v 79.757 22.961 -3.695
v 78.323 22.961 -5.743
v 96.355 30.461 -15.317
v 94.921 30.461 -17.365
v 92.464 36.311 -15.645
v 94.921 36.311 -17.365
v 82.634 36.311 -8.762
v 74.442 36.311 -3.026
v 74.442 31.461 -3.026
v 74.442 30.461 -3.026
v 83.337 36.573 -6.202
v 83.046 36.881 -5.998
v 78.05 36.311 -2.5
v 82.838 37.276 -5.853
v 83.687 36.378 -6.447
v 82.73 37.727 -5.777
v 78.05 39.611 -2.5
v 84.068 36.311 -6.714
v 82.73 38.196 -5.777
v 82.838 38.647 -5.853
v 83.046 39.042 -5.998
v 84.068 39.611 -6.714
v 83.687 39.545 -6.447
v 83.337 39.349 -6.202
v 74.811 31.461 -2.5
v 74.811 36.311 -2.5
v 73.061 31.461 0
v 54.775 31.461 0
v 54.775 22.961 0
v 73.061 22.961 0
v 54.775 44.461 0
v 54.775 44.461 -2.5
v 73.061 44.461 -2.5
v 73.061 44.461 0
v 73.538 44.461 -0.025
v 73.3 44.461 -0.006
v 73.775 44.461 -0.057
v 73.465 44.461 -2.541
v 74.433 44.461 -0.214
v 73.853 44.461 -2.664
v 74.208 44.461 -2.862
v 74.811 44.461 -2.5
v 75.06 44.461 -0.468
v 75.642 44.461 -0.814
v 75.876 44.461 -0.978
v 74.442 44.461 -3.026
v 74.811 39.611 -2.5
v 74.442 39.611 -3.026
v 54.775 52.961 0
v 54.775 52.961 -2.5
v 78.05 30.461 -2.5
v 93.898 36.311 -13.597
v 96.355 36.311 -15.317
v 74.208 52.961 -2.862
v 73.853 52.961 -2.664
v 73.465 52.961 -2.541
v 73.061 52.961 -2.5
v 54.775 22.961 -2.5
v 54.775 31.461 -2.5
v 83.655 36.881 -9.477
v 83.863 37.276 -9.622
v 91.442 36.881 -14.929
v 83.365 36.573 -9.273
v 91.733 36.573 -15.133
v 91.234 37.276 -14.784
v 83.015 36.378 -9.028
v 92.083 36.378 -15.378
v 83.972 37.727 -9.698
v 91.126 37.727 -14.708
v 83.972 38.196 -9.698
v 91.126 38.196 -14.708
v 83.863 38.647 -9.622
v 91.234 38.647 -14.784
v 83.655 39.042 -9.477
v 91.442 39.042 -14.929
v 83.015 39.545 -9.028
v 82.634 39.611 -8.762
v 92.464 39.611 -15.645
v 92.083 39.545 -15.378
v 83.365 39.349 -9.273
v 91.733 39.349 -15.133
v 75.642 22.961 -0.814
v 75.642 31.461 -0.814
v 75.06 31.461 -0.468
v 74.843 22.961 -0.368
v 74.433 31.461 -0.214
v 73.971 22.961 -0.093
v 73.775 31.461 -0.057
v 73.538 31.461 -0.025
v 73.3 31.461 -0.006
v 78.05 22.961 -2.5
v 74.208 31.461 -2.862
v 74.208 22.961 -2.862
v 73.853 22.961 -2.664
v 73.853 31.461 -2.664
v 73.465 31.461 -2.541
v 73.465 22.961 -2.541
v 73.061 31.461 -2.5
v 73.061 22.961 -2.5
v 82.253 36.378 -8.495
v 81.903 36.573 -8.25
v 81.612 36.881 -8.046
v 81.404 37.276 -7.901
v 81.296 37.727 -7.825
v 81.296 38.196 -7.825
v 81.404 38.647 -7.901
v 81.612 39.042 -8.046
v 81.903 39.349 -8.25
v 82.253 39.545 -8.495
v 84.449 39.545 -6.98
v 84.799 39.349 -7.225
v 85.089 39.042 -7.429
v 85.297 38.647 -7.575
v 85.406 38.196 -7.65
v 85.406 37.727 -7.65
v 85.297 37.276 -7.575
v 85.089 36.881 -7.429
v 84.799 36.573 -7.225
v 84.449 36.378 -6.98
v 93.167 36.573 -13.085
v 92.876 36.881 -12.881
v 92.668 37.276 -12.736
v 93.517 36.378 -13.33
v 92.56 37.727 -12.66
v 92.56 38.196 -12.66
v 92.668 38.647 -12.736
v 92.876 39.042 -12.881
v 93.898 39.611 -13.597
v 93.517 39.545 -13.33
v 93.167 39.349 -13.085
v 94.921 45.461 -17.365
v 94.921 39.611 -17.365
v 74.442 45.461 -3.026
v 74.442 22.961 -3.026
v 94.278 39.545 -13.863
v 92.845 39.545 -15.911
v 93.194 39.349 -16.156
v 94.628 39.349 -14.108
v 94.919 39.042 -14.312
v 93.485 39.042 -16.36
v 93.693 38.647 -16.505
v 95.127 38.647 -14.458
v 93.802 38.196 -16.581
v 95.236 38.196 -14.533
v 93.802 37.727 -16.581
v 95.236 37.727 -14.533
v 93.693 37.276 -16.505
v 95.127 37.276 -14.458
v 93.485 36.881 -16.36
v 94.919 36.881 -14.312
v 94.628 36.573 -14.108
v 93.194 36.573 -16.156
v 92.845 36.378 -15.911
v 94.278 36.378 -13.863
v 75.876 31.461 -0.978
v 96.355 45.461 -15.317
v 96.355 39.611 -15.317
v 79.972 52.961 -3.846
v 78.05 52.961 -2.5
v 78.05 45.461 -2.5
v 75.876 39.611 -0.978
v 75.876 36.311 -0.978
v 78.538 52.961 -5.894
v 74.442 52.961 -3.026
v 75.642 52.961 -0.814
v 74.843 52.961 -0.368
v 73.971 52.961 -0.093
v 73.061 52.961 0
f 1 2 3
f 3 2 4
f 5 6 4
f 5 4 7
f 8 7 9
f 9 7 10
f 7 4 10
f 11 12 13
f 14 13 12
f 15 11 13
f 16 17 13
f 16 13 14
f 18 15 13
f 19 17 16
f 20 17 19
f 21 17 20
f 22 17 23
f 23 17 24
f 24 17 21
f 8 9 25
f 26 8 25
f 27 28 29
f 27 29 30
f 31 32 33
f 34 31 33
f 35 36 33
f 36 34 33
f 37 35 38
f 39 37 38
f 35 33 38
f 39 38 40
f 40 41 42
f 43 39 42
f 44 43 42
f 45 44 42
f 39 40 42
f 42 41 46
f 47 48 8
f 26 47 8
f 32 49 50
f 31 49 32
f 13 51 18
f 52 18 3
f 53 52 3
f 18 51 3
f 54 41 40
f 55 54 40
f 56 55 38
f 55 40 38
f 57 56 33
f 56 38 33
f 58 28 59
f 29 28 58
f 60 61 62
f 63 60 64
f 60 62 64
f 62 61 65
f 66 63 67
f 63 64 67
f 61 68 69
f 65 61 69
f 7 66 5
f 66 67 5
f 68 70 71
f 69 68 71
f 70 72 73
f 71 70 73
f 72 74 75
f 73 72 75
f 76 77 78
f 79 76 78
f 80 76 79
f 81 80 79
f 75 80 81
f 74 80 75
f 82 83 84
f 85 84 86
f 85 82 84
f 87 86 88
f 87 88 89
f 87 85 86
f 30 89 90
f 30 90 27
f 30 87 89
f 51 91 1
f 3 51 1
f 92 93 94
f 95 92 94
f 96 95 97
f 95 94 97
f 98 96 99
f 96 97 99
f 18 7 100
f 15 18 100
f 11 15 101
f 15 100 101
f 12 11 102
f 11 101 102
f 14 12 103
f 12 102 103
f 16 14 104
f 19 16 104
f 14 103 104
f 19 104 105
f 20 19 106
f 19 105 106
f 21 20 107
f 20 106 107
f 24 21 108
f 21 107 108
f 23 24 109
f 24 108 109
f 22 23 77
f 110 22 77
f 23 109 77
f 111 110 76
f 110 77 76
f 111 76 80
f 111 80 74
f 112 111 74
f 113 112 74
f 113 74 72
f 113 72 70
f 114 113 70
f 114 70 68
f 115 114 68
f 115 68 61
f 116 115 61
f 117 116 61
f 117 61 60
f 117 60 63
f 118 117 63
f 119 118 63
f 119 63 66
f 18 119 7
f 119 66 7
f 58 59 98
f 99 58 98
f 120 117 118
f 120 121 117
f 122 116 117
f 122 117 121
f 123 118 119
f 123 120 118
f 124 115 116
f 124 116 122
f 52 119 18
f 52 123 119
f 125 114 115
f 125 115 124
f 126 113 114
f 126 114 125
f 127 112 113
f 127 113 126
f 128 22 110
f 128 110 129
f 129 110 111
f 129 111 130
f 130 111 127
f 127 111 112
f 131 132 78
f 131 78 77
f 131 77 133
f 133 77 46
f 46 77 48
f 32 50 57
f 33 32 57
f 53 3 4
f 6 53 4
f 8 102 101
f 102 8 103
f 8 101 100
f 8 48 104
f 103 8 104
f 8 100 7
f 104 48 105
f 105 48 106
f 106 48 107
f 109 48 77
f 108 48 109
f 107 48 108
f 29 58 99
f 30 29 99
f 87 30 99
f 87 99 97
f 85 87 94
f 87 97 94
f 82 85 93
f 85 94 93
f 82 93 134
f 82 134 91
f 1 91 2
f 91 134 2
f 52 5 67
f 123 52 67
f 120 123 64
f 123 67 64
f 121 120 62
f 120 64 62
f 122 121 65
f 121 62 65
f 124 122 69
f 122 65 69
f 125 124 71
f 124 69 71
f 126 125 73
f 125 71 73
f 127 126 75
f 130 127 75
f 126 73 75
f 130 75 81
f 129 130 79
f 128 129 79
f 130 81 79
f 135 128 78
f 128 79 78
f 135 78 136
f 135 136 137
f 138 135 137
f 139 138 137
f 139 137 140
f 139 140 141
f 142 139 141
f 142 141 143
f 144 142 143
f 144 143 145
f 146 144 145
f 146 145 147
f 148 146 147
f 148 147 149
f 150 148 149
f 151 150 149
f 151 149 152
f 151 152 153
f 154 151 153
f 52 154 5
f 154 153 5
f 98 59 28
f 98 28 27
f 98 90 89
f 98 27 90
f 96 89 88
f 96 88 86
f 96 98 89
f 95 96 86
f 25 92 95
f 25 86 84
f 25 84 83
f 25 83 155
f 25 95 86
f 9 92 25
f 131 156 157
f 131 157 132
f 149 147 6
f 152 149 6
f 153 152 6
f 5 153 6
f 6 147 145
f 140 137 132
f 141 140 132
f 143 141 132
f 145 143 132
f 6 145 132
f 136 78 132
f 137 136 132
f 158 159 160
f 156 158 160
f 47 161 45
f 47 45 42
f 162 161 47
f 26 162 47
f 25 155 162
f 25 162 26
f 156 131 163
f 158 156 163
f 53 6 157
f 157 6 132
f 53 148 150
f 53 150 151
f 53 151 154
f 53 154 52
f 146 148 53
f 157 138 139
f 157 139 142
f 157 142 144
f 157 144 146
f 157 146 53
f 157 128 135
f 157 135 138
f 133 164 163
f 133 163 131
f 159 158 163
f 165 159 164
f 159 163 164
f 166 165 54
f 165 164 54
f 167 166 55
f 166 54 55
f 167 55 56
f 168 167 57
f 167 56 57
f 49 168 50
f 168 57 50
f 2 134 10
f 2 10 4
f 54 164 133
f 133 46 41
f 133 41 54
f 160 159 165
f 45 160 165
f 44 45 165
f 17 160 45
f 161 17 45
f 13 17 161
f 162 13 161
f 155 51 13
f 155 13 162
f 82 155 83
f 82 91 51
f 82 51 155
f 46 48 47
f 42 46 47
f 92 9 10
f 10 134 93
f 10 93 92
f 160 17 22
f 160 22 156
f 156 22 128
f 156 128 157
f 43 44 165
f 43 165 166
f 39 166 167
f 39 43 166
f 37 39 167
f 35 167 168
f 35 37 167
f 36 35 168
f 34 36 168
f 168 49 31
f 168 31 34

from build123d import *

# Parameters (mm, degrees)
SM_BASE_FLANGE_1_DEPTH = 2.5
HOLE_WIZARD_M41_D      = 3.3
OTHER_START            = 45.056896686
OTHER_7_OUTLINE_R      = 1.65
OTHER_7_DEPTH          = 7.095461821
OTHER_START_2          = 22.961384977
OTHER_7_2_DEPTH        = 30
OTHER_START_3          = 31.461384977
OTHER_7_3_DEPTH        = 13
OTHER_START_4          = 39.611384977
OTHER_7_4_DEPTH        = 5.85
OTHER_START_5          = 30.461384977
OTHER_7_5_DEPTH        = 5.8499999
OTHER_7_6_DEPTH        = 8.5
OTHER_START_6          = 44.461384977
OTHER_7_7_DEPTH        = 8.5
OTHER_START_7          = 40.219785041
OTHER_7_8_DEPTH        = 2.5


with BuildPart() as part:
    # Базовая кромка1: sheet metal written as solids
    # Sketch 1 → Базовая кромка1 (new body)
    with BuildSketch(Plane.XY):
        Polygon((54.77467234, 44.461384977), (73.77467234, 44.461384977), (73.77467234, 31.461384977), (54.77467234, 31.461384977), (54.77467234, 22.961384977), (78.511603406, 22.961384977), (98.77467234, 30.461384977), (98.77467234, 45.461384977), (78.77467234, 52.961384977), (54.77467234, 52.961384977), align=None)
    extrude(amount=-SM_BASE_FLANGE_1_DEPTH)

    # Отверстие обработанное метчиком M41 (through all)
    with Locations(Plane.XY):
        with Locations((83.77467234, 37.961384977), (95.77467234, 37.961384977)):
            Hole(HOLE_WIZARD_M41_D / 2)

    # Other 7: read off the stored shape, not the designer's step
    # Other 7 outline → Other 7 (cut)
    with BuildSketch(Plane(origin=(0, 0, 0), x_dir=(0.819152044288991, 0, -0.5735764363510472), z_dir=(0.5735764363510472, 0, 0.8191520442889911)).offset(OTHER_START)):
        with Locations((72.715175855, 37.961384977)):
            Circle(OTHER_7_OUTLINE_R)
    extrude(amount=OTHER_7_DEPTH, mode=Mode.SUBTRACT)

    # Other 7 2 outline → Other 7 2 (cut)
    with BuildSketch(Plane(origin=(0, 0, 0), x_dir=(1, 0, 0), z_dir=(0, 1, 0)).offset(OTHER_START_2)):
        with BuildLine():
            Line((98.77467234, 2.5), (78.050042356, 2.5))
            Line((78.050042356, 2.5), (75.641921753, 0.813815801))
            ThreePointArc((75.641921753, 0.813815801), (74.414003887, 0.208273722), (73.06082779, 0))
            Line((73.06082779, 0), (98.77467234, 0))
            Line((98.77467234, 0), (98.77467234, 2.5))
        make_face()
    extrude(amount=OTHER_7_2_DEPTH, mode=Mode.SUBTRACT)

    # Other 7 3 outline → Other 7 3 (cut)
    with BuildSketch(Plane(origin=(0, 0, 0), x_dir=(1, 0, 0), z_dir=(0, 1, 0)).offset(OTHER_START_3)):
        with BuildLine():
            Line((75.641921753, 0.813815801), (75.876326575, 0.977947824))
            Line((75.876326575, 0.977947824), (74.810574168, 2.5))
            Line((74.810574168, 2.5), (73.77467234, 2.5))
            Line((73.77467234, 2.5), (73.77467234, 0.056980086))
            ThreePointArc((73.77467234, 0.056980086), (74.751199059, 0.329550987), (75.641921753, 0.813815801))
        make_face()
    extrude(amount=OTHER_7_3_DEPTH, mode=Mode.SUBTRACT)

    # Other 7 4 outline → Other 7 4 (add)
    with BuildSketch(Plane(origin=(0, 0, 0), x_dir=(1, 0, 0), z_dir=(0, 1, 0)).offset(OTHER_START_4)):
        Polygon((78.050042356, 2.5), (96.355127682, 15.317358733), (94.921186591, 17.365238843), (74.442385484, 3.025827935), (74.810574168, 2.5), align=None)
    extrude(amount=OTHER_7_4_DEPTH)

    # Other 7 5 outline → Other 7 5 (add)
    with BuildSketch(Plane(origin=(0, 0, 0), x_dir=(1, 0, 0), z_dir=(0, 1, 0)).offset(OTHER_START_5)):
        Polygon((78.050042356, 2.5), (96.355127682, 15.317358733), (94.921186591, 17.365238843), (74.442385484, 3.025827935), (74.810574168, 2.5), align=None)
    extrude(amount=OTHER_7_5_DEPTH)

    # Other 7 6 outline → Other 7 6 (add)
    with BuildSketch(Plane(origin=(0, 0, 0), x_dir=(1, 0, 0), z_dir=(0, 1, 0)).offset(OTHER_START_2)):
        with BuildLine():
            Line((74.810574168, 2.5), (74.442385484, 3.025827935))
            Line((74.442385484, 3.025827935), (74.207980662, 2.861695911))
            ThreePointArc((74.207980662, 2.861695911), (73.662239388, 2.592566099), (73.06082779, 2.5))
            Line((73.06082779, 2.5), (74.810574168, 2.5))
        make_face()
    extrude(amount=OTHER_7_6_DEPTH)

    # Other 7 7 outline → Other 7 7 (add)
    with BuildSketch(Plane(origin=(0, 0, 0), x_dir=(1, 0, 0), z_dir=(0, 1, 0)).offset(OTHER_START_6)):
        with BuildLine():
            Line((74.810574168, 2.5), (74.442385484, 3.025827935))
            Line((74.442385484, 3.025827935), (74.207980662, 2.861695911))
            ThreePointArc((74.207980662, 2.861695911), (73.662239388, 2.592566099), (73.06082779, 2.5))
            Line((73.06082779, 2.5), (74.810574168, 2.5))
        make_face()
    extrude(amount=OTHER_7_7_DEPTH)

    # Other 7 8 outline → Other 7 8 (add)
    with BuildSketch(Plane(origin=(0, 0, 0), x_dir=(0.819152044288991, 0, -0.5735764363510472), z_dir=(0.5735764363510472, 0, 0.8191520442889911)).offset(OTHER_START_7)):
        Polygon((87.715175855, 45.461384977), (67.715175855, 52.961384977), (62.715175855, 52.961384977), (62.715175855, 45.461384977), align=None)
        Polygon((67.452106922, 22.961384977), (87.715175855, 30.461384977), (62.715175855, 30.461384977), (62.715175855, 22.961384977), align=None)
        with BuildLine():
            Line((87.715175855, 36.311384877), (87.715175855, 39.611384977))
            Line((87.715175855, 39.611384977), (84.715175855, 39.611384977))
            ThreePointArc((84.715175855, 39.611384977), (86.365175855, 37.961384977), (84.715175855, 36.311384977))
            Line((84.715175855, 36.311384977), (87.715175855, 36.311384877))
        make_face()
        with BuildLine():
            ThreePointArc((84.715175855, 36.311384977), (83.065175855, 37.961384977), (84.715175855, 39.611384977))
            Line((84.715175855, 39.611384977), (72.715175855, 39.611384977))
            ThreePointArc((72.715175855, 39.611384977), (74.365175855, 37.961384977), (72.715175855, 36.311384977))
            Line((72.715175855, 36.311384977), (84.715175855, 36.311384977))
        make_face()
        with BuildLine():
            ThreePointArc((72.715175855, 36.311384977), (71.065175855, 37.961384977), (72.715175855, 39.611384977))
            Line((72.715175855, 39.611384977), (62.715175855, 39.611384977))
            Line((62.715175855, 39.611384977), (62.715175855, 36.311384877))
            Line((62.715175855, 36.311384877), (72.715175855, 36.311384977))
        make_face()
    extrude(amount=OTHER_7_8_DEPTH)


solid = part.part
